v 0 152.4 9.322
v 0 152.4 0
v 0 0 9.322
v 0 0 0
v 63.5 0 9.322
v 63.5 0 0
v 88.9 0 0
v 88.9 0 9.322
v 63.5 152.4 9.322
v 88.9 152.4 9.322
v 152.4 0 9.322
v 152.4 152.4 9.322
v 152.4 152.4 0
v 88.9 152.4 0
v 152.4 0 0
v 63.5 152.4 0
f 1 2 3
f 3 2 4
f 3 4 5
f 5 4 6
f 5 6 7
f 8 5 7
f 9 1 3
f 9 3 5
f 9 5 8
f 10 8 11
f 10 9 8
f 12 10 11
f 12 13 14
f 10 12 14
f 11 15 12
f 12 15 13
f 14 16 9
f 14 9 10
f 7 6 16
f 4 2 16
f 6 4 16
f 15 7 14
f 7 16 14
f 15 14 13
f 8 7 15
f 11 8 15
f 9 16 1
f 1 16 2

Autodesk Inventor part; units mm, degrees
ref_plane "YZ Plane" through (0, 0, 0) normal (1, 0, 0) x (0, 1, 0)
ref_plane "XZ Plane" through (0, 0, 0) normal (0, 1, 0) x (-1, 0, 0)
ref_plane "XY Plane" through (0, 0, 0) normal (0, 0, 1) x (1, 0, 0)
sketch "Sketch1" plane through (0, 0, 0) normal (0, 0, 1) x (1, 0, 0)
  line L0 (0, 0) -> (152.4, 0)
  line L1 (152.4, 0) -> (152.4, 152.4)
  line L2 (0, 152.4) -> (0, 0)
  line L3 (152.4, 152.4) -> (88.9, 152.4)
  line L4 (63.5, 152.4) -> (0, 152.4)
  line L5 (63.5, 0) -> (88.9, 0)
  line L6 (63.5, 152.4) -> (88.9, 152.4)
  line L7 (0, 152.4) -> (0, 0)
  line L8 (152.4, 0) -> (0, 0)
extrude "Extrusion1" add sketch "Sketch1" along normal blind 9.3218
properties part number "air layer"
